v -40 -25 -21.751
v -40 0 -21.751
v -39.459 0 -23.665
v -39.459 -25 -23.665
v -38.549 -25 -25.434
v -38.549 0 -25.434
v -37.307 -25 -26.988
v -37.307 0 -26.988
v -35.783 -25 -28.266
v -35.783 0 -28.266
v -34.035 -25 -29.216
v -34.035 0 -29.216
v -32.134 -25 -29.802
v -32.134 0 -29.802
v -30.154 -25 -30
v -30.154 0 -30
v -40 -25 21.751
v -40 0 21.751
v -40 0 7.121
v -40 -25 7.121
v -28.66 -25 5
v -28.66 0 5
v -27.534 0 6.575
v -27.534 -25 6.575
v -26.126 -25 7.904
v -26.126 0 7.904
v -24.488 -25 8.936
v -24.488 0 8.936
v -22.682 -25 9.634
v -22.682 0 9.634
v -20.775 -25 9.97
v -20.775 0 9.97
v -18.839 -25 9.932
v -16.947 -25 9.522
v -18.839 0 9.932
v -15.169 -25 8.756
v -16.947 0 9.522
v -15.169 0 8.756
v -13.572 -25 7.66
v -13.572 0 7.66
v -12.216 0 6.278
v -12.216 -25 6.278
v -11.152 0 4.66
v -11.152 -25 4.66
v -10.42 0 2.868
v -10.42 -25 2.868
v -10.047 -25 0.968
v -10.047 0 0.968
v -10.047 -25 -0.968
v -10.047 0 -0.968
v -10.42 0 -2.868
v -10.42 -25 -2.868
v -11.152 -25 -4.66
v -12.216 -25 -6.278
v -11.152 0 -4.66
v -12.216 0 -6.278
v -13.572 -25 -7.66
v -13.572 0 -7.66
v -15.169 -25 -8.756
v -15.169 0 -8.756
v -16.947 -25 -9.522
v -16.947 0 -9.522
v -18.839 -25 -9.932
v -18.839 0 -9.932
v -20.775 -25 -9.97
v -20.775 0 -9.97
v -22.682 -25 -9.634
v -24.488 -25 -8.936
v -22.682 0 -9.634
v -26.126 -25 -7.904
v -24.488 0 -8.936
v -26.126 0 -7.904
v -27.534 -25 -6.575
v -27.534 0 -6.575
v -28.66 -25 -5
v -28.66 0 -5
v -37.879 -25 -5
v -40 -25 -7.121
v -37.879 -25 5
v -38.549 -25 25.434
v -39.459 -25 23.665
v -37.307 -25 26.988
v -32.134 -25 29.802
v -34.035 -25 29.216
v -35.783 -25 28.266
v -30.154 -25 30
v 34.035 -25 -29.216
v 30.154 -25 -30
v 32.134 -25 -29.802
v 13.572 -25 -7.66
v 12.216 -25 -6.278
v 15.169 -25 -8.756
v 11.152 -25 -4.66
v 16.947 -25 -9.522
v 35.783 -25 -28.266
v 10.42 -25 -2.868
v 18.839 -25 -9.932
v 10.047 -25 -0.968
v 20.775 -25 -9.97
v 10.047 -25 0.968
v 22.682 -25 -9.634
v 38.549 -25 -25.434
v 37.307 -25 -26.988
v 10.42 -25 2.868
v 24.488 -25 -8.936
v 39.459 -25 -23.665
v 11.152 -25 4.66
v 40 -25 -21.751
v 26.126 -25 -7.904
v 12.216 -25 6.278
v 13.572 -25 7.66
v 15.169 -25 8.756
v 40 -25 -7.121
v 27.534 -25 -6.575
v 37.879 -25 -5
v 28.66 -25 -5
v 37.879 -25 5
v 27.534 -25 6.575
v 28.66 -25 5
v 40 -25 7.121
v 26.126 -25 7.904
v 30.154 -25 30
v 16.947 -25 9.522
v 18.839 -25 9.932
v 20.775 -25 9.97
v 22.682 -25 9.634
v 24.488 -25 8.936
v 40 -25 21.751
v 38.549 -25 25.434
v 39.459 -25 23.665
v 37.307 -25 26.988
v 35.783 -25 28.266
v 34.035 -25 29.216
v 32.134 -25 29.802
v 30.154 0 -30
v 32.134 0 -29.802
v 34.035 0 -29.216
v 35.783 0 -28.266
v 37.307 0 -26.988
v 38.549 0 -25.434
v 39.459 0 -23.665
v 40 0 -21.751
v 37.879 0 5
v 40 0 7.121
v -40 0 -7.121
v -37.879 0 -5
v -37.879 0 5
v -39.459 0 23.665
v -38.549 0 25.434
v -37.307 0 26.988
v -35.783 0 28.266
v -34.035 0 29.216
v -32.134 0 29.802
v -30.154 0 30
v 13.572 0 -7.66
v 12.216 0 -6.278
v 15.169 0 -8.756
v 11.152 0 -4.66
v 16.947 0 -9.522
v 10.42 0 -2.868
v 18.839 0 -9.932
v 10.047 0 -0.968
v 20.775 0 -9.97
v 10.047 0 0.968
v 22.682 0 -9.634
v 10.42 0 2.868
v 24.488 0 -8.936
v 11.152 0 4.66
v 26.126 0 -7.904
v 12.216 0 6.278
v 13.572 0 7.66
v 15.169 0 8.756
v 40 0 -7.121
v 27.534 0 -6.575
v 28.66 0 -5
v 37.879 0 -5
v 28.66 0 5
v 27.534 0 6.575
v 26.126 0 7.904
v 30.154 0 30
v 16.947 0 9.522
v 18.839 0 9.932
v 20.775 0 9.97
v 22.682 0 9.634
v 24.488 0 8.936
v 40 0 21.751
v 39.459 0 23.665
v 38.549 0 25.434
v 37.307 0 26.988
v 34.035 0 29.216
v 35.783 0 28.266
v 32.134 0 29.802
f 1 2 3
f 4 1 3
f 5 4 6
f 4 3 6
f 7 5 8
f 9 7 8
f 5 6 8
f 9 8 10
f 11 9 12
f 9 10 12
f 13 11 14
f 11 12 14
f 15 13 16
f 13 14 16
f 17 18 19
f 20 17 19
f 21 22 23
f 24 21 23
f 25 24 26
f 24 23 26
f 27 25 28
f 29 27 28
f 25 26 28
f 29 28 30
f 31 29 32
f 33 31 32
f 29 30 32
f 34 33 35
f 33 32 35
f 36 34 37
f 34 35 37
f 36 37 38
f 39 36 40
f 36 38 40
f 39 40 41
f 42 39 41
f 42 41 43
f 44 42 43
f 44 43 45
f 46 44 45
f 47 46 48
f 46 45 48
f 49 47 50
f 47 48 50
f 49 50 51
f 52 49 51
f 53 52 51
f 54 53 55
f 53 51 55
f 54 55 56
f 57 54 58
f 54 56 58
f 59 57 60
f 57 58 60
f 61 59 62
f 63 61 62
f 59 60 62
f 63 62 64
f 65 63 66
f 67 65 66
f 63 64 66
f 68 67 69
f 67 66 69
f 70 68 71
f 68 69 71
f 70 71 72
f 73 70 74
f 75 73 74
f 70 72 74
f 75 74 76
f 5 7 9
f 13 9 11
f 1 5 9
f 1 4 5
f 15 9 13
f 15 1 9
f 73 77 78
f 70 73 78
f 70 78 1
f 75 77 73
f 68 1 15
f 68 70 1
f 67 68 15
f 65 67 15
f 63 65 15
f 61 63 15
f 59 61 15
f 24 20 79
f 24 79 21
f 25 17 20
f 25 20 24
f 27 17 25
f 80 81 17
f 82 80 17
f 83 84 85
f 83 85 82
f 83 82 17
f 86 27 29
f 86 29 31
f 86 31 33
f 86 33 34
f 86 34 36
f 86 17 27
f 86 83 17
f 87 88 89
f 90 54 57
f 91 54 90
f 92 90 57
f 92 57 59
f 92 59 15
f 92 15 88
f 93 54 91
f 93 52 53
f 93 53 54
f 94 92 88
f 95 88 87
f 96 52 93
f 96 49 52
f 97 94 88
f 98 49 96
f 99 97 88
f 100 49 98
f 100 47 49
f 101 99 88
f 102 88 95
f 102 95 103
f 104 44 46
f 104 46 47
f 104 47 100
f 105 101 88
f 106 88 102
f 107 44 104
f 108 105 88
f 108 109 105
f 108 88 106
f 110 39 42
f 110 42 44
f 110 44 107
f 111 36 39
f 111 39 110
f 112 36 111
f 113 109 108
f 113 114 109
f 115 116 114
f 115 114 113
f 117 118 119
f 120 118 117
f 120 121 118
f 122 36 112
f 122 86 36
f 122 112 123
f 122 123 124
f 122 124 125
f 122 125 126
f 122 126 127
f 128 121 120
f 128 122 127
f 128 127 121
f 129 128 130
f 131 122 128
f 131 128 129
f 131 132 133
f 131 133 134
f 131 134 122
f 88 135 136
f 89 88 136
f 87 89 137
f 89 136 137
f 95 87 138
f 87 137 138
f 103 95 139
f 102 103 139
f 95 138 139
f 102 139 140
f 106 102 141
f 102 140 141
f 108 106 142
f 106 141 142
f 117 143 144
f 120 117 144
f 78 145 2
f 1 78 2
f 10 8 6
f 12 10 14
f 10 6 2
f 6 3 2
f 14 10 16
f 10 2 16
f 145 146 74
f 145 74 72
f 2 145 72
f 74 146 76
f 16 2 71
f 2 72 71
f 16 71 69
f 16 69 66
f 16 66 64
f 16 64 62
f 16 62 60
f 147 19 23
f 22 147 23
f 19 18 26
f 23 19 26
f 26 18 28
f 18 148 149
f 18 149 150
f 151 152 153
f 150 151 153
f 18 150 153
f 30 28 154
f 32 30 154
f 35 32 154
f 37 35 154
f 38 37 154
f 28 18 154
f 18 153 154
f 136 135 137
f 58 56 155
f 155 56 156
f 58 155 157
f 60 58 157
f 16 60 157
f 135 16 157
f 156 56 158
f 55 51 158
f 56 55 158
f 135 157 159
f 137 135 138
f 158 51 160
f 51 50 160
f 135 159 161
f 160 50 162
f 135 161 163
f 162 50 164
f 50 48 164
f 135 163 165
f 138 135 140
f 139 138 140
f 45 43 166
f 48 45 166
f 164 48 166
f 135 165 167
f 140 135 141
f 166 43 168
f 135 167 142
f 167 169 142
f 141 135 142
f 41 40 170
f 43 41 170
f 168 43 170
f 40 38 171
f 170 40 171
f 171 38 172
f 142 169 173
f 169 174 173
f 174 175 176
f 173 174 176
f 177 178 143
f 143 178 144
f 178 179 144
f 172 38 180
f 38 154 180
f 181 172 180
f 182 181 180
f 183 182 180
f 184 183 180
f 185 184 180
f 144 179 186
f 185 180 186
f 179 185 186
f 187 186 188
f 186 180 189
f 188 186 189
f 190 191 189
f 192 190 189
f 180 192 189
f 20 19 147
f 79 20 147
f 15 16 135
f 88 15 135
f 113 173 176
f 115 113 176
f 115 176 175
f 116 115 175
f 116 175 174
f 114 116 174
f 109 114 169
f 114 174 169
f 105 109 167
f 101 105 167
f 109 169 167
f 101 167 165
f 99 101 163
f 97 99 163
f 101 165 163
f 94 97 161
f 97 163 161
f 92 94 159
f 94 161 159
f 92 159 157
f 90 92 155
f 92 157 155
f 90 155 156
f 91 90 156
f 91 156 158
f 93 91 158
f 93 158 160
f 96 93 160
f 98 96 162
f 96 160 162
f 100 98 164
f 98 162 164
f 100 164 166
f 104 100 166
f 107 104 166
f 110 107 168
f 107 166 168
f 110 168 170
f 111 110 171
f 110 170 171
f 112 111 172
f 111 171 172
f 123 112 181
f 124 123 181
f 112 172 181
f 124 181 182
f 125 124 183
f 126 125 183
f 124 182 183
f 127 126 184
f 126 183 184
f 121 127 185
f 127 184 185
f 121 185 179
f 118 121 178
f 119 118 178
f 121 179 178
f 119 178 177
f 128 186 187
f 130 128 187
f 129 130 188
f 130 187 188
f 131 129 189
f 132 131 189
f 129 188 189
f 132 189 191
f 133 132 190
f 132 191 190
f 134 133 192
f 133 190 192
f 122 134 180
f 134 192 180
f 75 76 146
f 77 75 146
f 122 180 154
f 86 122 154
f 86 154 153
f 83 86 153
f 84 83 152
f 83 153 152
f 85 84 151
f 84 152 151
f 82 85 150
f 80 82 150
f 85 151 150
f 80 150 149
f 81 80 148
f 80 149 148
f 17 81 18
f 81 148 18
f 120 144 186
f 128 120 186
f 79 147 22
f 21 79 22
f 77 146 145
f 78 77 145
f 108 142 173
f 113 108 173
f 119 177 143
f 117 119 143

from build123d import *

# Parameters (mm, degrees)
F1_DEPTH = 25


with BuildPart() as f1:
    # F0 (on Front) → F1 (new body)
    with BuildSketch(Plane.XZ):
        with BuildLine():
            Line((30.154407, 30), (0, 30))
            Line((0, 30), (-30.154407, 30))
            ThreePointArc((-30.154407, 30), (-36.576823, 27.665023), (-40, 21.750515))
            Line((-40, 21.750515), (-40, 7.12132))
            Line((-40, 7.12132), (-37.87868, 5))
            Line((-37.87868, 5), (-28.660254, 5))
            ThreePointArc((-28.660254, 5), (-10, 0), (-28.660254, -5))
            Line((-28.660254, -5), (-37.87868, -5))
            Line((-37.87868, -5), (-40, -7.12132))
            Line((-40, -7.12132), (-40, -21.750515))
            ThreePointArc((-40, -21.750515), (-36.576823, -27.665023), (-30.154407, -30))
            Line((-30.154407, -30), (0, -30))
            Line((0, -30), (30.154407, -30))
            ThreePointArc((30.154407, -30), (36.576823, -27.665023), (40, -21.750515))
            Line((40, -21.750515), (40, -7.12132))
            Line((40, -7.12132), (37.87868, -5))
            Line((37.87868, -5), (28.660254, -5))
            ThreePointArc((28.660254, -5), (10, 0), (28.660254, 5))
            Line((28.660254, 5), (37.87868, 5))
            Line((37.87868, 5), (40, 7.12132))
            Line((40, 7.12132), (40, 21.750515))
            ThreePointArc((40, 21.750515), (36.576823, 27.665023), (30.154407, 30))
        make_face()
    extrude(amount=F1_DEPTH)


solid = f1.part
